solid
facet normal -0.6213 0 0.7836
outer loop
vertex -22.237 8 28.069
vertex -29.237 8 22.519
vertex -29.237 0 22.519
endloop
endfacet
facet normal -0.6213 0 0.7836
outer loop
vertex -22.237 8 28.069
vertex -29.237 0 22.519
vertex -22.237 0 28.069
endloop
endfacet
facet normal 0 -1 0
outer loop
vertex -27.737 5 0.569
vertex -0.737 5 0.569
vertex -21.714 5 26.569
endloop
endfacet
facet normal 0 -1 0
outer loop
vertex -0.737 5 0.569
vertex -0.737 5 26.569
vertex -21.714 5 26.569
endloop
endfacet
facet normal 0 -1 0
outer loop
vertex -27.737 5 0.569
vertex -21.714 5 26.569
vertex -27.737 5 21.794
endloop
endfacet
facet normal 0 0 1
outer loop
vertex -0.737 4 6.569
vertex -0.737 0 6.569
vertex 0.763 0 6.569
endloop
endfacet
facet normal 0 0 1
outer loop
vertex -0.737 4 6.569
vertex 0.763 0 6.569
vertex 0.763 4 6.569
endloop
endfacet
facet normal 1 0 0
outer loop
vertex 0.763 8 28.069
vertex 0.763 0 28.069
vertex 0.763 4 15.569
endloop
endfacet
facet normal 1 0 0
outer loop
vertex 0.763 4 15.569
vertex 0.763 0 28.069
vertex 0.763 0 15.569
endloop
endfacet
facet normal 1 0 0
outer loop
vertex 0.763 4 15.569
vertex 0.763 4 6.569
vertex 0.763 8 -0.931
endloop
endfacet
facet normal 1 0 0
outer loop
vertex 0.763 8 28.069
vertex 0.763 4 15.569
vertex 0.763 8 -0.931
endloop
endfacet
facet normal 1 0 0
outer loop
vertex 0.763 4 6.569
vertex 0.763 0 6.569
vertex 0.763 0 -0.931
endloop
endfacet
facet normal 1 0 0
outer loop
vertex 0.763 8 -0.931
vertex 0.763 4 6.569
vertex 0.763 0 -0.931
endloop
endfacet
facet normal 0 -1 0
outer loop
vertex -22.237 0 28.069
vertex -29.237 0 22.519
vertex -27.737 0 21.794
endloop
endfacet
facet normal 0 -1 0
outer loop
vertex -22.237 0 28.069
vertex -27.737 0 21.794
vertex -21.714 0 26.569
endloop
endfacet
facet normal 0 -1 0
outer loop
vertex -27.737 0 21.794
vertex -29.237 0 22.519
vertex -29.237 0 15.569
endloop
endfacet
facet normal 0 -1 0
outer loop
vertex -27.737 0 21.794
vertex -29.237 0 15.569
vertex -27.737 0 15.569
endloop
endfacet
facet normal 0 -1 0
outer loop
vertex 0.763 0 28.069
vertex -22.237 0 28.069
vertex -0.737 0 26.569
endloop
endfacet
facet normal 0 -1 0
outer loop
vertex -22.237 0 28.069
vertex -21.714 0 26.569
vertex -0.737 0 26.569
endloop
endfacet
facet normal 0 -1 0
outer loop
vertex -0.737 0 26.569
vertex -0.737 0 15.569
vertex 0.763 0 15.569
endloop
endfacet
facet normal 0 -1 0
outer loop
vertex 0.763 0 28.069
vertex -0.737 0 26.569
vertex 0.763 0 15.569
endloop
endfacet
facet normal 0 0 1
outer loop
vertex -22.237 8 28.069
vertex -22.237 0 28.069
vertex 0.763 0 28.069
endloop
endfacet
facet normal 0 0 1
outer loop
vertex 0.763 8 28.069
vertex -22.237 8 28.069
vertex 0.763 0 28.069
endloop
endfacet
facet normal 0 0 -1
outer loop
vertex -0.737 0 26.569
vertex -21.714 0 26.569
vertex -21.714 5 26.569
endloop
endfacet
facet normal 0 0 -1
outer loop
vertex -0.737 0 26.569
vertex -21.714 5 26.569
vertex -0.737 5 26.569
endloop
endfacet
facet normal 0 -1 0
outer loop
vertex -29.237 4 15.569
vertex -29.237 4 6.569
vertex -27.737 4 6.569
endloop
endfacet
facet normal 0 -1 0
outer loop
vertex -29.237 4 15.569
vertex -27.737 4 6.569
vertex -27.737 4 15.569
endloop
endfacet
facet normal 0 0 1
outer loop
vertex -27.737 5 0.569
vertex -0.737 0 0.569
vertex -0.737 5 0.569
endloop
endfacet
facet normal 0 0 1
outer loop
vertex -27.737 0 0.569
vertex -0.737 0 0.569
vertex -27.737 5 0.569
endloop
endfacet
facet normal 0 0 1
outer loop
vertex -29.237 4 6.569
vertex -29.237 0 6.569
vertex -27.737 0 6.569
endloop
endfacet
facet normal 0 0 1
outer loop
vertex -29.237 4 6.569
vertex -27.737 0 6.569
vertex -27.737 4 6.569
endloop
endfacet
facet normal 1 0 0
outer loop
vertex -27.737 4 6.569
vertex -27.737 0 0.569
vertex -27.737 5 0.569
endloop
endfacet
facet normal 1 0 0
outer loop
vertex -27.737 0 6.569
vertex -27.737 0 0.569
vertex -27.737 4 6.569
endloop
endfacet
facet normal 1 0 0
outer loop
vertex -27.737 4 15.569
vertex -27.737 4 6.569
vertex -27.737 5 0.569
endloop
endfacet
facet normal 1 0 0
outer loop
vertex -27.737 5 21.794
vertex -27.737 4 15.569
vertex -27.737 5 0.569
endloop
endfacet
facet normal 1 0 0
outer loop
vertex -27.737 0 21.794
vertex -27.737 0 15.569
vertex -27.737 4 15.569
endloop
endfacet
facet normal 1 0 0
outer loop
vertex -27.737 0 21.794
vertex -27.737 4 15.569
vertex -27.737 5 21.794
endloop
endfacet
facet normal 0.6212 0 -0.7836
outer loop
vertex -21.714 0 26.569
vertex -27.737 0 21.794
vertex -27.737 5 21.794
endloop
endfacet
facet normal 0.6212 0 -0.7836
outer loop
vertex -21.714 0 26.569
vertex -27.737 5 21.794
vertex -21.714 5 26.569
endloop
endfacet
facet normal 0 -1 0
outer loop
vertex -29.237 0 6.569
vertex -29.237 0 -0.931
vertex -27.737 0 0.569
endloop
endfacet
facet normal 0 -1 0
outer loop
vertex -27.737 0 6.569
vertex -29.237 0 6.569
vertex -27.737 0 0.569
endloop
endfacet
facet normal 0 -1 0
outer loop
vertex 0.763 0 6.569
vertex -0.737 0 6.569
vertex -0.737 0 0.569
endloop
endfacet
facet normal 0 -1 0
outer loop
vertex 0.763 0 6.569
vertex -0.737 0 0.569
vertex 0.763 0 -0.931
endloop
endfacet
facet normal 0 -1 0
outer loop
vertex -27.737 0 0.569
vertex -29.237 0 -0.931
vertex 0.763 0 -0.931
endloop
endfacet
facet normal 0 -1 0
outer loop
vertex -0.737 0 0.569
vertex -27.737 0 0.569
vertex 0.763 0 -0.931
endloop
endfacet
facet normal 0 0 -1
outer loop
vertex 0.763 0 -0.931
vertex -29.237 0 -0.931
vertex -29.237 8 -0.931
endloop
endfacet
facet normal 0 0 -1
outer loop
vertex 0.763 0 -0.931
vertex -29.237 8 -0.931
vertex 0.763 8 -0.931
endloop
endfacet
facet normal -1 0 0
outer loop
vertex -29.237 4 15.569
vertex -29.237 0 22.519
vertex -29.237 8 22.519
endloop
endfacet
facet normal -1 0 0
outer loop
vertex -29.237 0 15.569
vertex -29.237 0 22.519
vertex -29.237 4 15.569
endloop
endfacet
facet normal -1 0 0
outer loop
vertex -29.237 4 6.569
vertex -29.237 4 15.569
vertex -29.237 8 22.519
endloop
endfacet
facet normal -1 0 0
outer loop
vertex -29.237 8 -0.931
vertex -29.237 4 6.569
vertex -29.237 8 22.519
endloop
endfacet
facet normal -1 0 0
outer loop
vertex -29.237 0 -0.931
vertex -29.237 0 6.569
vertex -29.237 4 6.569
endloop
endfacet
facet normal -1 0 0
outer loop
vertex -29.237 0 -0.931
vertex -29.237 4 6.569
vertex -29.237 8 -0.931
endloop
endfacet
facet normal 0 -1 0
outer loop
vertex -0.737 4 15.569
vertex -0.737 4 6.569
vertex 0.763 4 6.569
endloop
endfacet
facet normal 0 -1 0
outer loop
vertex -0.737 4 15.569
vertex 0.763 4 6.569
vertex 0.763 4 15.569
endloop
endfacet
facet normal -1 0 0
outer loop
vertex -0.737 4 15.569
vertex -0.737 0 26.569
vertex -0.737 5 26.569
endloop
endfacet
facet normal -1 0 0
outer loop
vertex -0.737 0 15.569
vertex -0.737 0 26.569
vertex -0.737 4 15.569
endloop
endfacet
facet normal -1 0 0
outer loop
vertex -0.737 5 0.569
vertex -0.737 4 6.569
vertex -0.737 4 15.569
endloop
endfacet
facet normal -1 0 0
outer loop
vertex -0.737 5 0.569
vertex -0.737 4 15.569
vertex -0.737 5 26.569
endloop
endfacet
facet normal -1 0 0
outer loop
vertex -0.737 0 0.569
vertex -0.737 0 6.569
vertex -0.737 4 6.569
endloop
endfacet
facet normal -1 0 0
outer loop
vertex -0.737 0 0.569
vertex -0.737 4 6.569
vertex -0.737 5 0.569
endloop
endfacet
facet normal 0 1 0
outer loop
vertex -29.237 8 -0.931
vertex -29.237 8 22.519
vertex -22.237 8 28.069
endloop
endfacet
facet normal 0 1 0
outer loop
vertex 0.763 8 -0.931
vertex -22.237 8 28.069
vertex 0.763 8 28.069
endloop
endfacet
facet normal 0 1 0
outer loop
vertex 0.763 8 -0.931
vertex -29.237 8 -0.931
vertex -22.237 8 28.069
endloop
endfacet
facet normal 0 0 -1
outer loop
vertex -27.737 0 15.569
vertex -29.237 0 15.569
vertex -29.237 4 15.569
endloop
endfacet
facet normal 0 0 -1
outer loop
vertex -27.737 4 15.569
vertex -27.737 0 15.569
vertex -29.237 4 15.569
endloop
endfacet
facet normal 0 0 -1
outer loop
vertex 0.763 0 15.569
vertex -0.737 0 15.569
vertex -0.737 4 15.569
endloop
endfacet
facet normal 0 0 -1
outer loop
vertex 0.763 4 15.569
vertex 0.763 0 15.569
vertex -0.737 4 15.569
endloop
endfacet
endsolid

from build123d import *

# Parameters (mm, degrees)
SKETCH1_W           = 30
SKETCH1_H           = 29
BOSS_EXTRUDE1_DEPTH = 8
SKETCH2_W           = 24
SKETCH2_H           = 8
CUT_EXTRUDE1_DEPTH  = 8
CUT_EXTRUDE2_DEPTH  = 8
CUT_EXTRUDE3_DEPTH  = 5
SKETCH5_W           = 9
SKETCH5_H           = 4
CUT_EXTRUDE4_DEPTH  = 30
SKETCH2_2_W         = 24
SKETCH2_2_H         = 8
BOSS_EXTRUDE2_DEPTH = 3


with BuildPart() as part:
    # Sketch1 → Boss-Extrude1 (new body)
    with BuildSketch(Plane(origin=(0, 0, 0), x_dir=(1, 0, 0), z_dir=(0, 1, 0))):
        with Locations((-14.236607143, -13.569196429)):
            Rectangle(SKETCH1_W, SKETCH1_H)
    extrude(amount=BOSS_EXTRUDE1_DEPTH)

    # Sketch2 → Cut-Extrude1 (cut)
    with BuildSketch(Plane(origin=(0, 8, 0), x_dir=(1, 0, 0), z_dir=(0, 1, 0))):
        with Locations((-14.236607143, -6.069196429)):
            Rectangle(SKETCH2_W, SKETCH2_H)
        with Locations((-14.236607143, -17.069196429)):
            Rectangle(SKETCH2_W, SKETCH2_H)
    extrude(amount=-CUT_EXTRUDE1_DEPTH, mode=Mode.SUBTRACT)

    # Sketch3 → Cut-Extrude2 (cut)
    with BuildSketch(Plane(origin=(0, 8, 0), x_dir=(1, 0, 0), z_dir=(0, 1, 0))):
        Polygon((-29.236607143, -22.519140749), (-22.236607143, -28.069196429), (-29.236607143, -28.069196429), align=None)
    extrude(amount=-CUT_EXTRUDE2_DEPTH, mode=Mode.SUBTRACT)

    # Sketch4 → Cut-Extrude3 (cut)
    with BuildSketch(Plane.XZ):
        Polygon((-0.736607143, 0.569196429), (-27.736607143, 0.569196429), (-27.736607143, 21.794168589), (-21.714109927, 26.569196429), (-0.736607143, 26.569196429), align=None)
    extrude(amount=-CUT_EXTRUDE3_DEPTH, mode=Mode.SUBTRACT)

    # Sketch5 → Cut-Extrude4 (cut)
    with BuildSketch(Plane.ZY.offset(29.236607143)):
        with Locations((11.069196429, 2)):
            Rectangle(SKETCH5_W, SKETCH5_H)
    extrude(amount=-CUT_EXTRUDE4_DEPTH, mode=Mode.SUBTRACT)

    # Sketch2<2> → Boss-Extrude2 (add)
    with BuildSketch(Plane(origin=(0, 8, 0), x_dir=(1, 0, 0), z_dir=(0, 1, 0))):
        with Locations((-14.236607143, -6.069196429)):
            Rectangle(SKETCH2_2_W, SKETCH2_2_H)
        with Locations((-14.236607143, -17.069196429)):
            Rectangle(SKETCH2_2_W, SKETCH2_2_H)
    extrude(amount=-BOSS_EXTRUDE2_DEPTH)


solid = part.part
